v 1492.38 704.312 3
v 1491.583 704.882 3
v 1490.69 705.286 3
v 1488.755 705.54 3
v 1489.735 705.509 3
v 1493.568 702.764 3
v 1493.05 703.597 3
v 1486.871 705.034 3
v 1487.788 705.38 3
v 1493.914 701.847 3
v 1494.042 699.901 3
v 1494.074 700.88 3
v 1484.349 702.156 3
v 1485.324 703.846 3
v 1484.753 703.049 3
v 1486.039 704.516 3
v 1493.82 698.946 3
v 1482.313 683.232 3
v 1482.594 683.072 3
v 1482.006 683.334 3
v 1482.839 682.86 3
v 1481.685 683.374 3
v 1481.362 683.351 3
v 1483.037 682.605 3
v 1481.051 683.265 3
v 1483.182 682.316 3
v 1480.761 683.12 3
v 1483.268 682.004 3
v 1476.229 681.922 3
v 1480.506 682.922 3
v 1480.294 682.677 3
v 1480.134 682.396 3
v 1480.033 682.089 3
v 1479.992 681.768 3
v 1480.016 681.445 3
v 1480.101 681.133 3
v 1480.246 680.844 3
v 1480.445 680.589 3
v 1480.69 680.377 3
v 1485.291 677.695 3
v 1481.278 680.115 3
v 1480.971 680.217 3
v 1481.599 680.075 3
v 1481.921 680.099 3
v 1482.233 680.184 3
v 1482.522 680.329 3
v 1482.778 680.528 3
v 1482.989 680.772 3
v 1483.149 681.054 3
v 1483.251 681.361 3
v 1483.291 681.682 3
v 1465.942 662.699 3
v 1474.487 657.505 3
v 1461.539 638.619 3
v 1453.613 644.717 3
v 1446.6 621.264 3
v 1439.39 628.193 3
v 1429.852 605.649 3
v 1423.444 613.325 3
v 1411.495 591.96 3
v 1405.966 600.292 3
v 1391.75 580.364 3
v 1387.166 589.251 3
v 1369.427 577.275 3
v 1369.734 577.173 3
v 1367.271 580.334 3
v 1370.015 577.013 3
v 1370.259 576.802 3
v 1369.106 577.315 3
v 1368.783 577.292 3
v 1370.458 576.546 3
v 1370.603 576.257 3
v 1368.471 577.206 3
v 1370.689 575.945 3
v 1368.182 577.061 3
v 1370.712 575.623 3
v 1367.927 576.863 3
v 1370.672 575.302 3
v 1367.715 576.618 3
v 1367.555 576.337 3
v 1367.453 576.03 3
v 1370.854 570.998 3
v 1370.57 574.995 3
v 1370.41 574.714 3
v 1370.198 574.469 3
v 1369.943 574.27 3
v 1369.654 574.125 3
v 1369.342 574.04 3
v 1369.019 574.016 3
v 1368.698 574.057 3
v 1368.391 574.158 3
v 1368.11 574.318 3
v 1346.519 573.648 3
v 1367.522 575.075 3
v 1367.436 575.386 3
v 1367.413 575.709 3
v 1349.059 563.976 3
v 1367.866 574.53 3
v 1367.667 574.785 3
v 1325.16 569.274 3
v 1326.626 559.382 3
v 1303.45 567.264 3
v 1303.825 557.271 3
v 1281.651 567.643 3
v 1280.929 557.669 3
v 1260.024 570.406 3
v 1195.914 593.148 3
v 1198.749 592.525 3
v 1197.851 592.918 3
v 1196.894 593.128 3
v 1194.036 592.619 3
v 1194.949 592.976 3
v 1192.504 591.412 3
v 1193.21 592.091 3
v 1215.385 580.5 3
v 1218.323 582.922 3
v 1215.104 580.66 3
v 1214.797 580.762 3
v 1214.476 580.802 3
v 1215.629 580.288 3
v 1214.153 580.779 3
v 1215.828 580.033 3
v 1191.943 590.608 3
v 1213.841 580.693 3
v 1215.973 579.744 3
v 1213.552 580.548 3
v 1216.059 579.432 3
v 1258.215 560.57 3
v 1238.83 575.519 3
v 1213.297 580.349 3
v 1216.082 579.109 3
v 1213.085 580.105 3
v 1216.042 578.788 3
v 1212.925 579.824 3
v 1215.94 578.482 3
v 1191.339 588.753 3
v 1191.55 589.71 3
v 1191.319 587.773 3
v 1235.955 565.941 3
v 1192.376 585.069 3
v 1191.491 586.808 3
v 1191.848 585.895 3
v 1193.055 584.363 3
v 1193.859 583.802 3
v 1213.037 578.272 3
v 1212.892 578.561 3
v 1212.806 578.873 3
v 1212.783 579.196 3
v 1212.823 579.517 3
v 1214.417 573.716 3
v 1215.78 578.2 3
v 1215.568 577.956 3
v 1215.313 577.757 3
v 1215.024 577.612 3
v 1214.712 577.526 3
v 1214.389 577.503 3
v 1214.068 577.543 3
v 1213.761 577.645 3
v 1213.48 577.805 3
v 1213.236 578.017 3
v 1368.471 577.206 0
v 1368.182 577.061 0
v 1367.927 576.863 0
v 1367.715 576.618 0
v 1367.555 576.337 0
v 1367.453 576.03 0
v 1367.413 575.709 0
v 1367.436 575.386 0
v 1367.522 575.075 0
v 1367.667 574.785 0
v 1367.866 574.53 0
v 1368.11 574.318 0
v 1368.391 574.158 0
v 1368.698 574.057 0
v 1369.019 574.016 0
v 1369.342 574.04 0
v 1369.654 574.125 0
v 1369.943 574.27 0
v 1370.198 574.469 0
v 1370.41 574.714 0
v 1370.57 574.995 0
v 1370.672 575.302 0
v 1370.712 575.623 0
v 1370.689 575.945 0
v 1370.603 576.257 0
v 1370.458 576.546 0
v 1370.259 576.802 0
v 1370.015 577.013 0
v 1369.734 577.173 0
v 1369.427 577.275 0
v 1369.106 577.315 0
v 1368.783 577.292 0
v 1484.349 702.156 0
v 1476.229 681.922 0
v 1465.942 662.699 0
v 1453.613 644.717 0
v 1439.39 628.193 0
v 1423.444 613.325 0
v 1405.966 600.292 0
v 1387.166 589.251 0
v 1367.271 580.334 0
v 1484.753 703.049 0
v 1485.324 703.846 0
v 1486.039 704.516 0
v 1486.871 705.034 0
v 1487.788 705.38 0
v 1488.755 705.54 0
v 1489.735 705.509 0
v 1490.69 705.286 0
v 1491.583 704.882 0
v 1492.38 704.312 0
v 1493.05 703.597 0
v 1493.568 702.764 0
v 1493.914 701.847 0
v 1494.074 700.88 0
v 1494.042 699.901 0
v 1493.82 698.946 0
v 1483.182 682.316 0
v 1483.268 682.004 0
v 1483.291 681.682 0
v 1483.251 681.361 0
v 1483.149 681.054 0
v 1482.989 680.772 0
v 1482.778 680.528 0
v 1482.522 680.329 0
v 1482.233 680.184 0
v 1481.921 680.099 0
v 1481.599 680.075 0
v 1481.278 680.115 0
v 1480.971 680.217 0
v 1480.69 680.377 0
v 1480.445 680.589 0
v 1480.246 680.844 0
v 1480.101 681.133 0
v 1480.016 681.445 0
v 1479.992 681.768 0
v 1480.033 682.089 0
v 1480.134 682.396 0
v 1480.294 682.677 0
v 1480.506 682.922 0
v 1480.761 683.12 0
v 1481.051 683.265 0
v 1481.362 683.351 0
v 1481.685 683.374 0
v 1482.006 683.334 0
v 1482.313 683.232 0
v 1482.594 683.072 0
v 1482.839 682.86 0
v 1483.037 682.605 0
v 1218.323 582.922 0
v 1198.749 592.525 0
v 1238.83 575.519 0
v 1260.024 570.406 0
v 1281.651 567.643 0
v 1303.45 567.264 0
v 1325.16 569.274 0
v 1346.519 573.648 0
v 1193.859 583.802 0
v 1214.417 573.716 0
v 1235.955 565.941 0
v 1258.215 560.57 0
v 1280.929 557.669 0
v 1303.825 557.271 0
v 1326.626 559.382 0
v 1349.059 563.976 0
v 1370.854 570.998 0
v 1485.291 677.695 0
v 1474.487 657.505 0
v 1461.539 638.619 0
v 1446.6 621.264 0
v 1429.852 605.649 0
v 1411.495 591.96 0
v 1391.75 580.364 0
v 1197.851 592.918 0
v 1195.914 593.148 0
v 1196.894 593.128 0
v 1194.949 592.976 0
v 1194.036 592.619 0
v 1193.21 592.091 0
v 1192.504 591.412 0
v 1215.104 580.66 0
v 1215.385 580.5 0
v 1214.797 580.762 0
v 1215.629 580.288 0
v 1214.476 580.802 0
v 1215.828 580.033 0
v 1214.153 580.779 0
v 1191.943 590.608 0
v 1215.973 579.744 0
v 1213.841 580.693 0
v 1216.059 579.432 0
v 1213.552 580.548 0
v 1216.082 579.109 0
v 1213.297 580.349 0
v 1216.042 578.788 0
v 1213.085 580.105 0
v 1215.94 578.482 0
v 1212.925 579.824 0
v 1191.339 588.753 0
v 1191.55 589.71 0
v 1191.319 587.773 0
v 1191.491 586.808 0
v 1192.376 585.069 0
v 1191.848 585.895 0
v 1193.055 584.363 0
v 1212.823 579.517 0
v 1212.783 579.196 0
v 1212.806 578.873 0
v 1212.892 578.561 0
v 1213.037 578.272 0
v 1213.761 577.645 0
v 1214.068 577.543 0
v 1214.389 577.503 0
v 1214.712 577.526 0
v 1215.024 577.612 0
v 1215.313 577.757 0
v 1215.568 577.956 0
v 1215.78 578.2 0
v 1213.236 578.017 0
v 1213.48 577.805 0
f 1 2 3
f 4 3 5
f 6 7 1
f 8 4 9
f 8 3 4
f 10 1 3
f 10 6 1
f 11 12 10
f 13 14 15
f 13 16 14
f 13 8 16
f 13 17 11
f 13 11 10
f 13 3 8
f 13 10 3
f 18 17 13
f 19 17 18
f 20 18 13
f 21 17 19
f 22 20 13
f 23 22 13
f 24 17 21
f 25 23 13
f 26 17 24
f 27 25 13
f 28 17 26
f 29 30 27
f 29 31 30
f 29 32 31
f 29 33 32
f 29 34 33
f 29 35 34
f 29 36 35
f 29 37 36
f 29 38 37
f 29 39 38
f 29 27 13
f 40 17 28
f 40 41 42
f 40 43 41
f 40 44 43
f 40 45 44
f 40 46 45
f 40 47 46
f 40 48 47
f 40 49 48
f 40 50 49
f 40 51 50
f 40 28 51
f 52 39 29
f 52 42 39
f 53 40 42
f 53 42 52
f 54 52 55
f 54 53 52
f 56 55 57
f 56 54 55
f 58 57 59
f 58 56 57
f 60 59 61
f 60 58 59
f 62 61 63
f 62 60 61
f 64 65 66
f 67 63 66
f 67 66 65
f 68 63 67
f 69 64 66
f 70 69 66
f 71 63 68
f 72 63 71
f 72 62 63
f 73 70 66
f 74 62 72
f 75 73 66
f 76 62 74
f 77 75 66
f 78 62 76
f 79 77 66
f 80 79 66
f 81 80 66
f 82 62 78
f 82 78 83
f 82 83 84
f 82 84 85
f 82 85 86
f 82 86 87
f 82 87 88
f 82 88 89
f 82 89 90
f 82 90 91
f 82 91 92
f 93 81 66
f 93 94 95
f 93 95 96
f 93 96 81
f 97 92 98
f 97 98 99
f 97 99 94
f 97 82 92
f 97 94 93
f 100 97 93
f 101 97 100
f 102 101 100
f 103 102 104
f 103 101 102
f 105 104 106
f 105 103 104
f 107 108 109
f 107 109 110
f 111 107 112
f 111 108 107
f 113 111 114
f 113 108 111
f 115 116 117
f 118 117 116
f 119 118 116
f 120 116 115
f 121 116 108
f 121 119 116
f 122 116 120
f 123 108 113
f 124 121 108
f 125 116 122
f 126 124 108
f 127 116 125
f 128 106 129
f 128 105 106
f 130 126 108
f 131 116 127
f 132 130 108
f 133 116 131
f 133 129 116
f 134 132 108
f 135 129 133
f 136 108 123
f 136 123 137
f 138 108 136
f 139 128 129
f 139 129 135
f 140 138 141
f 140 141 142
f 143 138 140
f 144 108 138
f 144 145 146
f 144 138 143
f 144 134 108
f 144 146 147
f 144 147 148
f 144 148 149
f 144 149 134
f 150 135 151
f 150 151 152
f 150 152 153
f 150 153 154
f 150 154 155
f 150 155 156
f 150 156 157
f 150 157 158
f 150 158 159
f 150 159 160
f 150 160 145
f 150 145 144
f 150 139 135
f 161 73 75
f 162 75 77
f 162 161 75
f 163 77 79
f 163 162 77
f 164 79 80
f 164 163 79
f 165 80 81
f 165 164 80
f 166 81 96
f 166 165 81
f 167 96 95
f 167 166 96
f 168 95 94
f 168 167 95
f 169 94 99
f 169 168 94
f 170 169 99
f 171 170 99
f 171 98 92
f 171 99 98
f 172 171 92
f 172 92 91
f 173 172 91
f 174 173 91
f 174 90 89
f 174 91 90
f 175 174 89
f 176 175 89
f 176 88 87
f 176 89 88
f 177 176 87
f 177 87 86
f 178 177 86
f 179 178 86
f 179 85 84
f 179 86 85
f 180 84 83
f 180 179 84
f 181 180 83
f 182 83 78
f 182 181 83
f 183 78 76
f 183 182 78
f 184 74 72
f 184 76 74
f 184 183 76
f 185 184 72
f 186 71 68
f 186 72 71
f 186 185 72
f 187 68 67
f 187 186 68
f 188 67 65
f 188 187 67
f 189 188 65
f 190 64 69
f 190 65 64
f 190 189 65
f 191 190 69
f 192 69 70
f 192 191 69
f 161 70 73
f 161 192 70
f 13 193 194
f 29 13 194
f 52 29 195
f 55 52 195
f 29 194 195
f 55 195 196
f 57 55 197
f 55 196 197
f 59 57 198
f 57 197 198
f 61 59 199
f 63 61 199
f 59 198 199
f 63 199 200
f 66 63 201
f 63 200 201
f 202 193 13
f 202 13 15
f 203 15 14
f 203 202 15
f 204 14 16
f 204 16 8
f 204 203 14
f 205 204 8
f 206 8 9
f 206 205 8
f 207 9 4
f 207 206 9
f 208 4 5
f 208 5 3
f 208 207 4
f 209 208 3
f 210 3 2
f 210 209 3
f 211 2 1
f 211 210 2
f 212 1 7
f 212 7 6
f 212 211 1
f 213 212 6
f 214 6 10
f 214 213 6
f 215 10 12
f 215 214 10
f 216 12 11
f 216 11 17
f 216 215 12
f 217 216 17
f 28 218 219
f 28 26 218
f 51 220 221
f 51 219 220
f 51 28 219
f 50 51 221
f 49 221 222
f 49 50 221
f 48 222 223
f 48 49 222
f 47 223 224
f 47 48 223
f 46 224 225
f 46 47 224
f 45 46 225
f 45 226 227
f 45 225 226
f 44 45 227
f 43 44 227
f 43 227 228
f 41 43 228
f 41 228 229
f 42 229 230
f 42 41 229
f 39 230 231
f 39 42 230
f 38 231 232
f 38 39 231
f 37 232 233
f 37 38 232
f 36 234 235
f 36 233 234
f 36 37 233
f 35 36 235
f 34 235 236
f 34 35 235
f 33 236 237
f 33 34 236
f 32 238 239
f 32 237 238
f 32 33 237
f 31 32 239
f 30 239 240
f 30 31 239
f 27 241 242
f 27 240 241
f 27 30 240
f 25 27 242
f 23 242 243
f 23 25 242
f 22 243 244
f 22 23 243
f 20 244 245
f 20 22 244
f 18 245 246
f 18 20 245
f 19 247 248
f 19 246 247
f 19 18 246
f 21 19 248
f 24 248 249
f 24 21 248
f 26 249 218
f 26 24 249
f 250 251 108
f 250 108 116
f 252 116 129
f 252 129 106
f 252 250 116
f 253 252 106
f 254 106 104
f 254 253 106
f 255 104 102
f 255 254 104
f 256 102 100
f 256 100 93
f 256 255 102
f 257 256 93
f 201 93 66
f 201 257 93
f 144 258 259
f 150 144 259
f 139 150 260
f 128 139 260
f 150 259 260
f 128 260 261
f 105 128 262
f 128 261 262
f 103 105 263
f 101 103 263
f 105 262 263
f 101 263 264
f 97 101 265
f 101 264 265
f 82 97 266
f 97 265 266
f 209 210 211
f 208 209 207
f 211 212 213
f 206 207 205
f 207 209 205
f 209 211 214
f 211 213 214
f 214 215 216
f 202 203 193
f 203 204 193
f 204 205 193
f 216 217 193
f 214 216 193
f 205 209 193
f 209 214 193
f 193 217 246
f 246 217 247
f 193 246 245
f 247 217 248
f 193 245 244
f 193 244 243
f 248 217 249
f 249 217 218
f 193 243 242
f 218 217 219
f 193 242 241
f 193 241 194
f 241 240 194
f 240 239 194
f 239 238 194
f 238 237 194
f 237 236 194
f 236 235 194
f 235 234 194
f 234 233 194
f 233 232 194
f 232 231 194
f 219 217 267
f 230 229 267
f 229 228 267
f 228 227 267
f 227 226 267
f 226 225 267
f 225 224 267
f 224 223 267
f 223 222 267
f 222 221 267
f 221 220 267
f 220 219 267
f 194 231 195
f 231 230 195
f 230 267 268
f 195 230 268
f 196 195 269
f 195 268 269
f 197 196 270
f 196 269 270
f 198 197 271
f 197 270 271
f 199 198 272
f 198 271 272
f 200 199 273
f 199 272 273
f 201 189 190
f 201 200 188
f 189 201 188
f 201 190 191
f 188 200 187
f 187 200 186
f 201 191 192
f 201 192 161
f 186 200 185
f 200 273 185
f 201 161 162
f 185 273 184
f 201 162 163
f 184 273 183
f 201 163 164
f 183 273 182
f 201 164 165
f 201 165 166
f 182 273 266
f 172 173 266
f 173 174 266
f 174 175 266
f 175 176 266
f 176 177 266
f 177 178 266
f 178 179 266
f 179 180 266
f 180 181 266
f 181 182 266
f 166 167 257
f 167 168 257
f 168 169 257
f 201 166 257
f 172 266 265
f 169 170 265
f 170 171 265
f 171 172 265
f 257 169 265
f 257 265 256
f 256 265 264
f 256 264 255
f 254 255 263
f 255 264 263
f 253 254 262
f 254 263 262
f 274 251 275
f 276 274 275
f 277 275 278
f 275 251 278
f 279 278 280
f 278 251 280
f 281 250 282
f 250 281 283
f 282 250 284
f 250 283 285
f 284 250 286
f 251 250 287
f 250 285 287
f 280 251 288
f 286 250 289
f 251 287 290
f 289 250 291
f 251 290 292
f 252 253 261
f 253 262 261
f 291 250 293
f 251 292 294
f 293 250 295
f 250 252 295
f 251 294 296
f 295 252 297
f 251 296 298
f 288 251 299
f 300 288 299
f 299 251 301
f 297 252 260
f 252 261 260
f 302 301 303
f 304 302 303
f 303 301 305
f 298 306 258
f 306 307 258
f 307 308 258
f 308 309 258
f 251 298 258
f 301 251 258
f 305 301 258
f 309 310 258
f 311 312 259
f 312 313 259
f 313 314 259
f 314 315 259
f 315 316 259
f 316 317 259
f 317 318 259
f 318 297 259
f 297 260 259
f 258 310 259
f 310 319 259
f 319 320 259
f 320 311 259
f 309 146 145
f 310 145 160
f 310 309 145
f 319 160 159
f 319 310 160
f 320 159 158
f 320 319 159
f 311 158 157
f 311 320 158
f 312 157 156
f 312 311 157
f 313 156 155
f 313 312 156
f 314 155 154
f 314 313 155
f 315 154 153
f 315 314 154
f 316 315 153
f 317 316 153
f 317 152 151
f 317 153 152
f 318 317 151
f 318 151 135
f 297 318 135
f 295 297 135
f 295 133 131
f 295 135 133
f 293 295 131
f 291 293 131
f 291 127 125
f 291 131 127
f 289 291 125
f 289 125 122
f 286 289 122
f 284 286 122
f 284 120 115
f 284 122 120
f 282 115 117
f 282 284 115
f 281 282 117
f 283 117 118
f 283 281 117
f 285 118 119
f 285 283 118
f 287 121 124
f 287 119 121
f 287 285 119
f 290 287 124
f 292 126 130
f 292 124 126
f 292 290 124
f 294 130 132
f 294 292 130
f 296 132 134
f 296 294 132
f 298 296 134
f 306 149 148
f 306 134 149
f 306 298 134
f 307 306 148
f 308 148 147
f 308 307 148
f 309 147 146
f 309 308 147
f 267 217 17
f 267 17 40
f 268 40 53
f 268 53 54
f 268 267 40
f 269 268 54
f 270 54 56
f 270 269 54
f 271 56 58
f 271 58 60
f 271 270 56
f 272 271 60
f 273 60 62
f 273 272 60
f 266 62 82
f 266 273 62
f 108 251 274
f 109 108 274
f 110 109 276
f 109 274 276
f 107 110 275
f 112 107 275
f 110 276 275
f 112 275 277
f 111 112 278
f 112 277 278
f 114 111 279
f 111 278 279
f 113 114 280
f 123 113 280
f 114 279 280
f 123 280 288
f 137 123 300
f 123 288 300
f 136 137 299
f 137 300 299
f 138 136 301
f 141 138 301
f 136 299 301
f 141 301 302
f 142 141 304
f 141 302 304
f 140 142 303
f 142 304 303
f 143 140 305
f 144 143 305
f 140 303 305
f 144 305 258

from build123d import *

# Parameters (mm, degrees)
PAD014_DEPTH                        = 3
SKETCH055_R                         = 1.65
POCKET019_DEPTH                     = 364.282338
POCKET019_DEPTH_BACK                = 367.282338
BODY001003005003003_PLACEMENT_ANGLE = 60
CLONE_PLACEMENT_ANGLE               = 141


with BuildPart() as part:
    # Sketch052 → Pad014 (new body)
    with BuildSketch(Plane.XY):
        with BuildLine():
            ThreePointArc((152.959511, 127.101705), (84.480895, 180.040089), (0, 198.875477))
            Line((0, 198.875477), (0, 208.875477))
            ThreePointArc((160.650731, 133.492724), (88.728824, 189.092995), (0, 208.875477))
            ThreePointArc((152.959511, 127.101705), (160.000631, 126.451604), (160.650731, 133.492724))
        make_face()
    pad014 = extrude(amount=PAD014_DEPTH)

    # Sketch055 → Pocket019 (cut, two sides)
    with BuildSketch(Plane.XY) as pocket019_sk:
        with Locations((143.11, 145.205847)):
            Circle(SKETCH055_R)
        with BuildLine():
            Line((0, 202.225477), (0, 205.525477))
            ThreePointArc((0, 202.225477), (1.65, 203.875477), (0, 205.525477))
        make_face()
    pocket019 = extrude(amount=-POCKET019_DEPTH, mode=Mode.SUBTRACT) + extrude(pocket019_sk.sketch, amount=POCKET019_DEPTH_BACK, mode=Mode.SUBTRACT)

    # Mirrored019: Pad014, Pocket019 across Sketch052 V_Axis
    add(pad014.mirror(Plane(origin=(0, 0, 0), x_dir=(0, 0, 1), z_dir=(1, 0, 0))))
    add(pocket019.mirror(Plane(origin=(0, 0, 0), x_dir=(0, 0, 1), z_dir=(1, 0, 0))), mode=Mode.SUBTRACT)


with BuildPart() as part_1:
    # Body001003005003003 placement: moved
    add(part.part.rotate(Axis((0, 0, 0), (0, 0, 1)), BODY001003005003003_PLACEMENT_ANGLE))


with BuildPart() as part_2:
    # Clone placement: moved
    add(part_1.part.moved(Location((1296, 766, 0))).rotate(Axis((1296, 766, 0), (0, 0, 1)), CLONE_PLACEMENT_ANGLE))


solid = part_2.part
